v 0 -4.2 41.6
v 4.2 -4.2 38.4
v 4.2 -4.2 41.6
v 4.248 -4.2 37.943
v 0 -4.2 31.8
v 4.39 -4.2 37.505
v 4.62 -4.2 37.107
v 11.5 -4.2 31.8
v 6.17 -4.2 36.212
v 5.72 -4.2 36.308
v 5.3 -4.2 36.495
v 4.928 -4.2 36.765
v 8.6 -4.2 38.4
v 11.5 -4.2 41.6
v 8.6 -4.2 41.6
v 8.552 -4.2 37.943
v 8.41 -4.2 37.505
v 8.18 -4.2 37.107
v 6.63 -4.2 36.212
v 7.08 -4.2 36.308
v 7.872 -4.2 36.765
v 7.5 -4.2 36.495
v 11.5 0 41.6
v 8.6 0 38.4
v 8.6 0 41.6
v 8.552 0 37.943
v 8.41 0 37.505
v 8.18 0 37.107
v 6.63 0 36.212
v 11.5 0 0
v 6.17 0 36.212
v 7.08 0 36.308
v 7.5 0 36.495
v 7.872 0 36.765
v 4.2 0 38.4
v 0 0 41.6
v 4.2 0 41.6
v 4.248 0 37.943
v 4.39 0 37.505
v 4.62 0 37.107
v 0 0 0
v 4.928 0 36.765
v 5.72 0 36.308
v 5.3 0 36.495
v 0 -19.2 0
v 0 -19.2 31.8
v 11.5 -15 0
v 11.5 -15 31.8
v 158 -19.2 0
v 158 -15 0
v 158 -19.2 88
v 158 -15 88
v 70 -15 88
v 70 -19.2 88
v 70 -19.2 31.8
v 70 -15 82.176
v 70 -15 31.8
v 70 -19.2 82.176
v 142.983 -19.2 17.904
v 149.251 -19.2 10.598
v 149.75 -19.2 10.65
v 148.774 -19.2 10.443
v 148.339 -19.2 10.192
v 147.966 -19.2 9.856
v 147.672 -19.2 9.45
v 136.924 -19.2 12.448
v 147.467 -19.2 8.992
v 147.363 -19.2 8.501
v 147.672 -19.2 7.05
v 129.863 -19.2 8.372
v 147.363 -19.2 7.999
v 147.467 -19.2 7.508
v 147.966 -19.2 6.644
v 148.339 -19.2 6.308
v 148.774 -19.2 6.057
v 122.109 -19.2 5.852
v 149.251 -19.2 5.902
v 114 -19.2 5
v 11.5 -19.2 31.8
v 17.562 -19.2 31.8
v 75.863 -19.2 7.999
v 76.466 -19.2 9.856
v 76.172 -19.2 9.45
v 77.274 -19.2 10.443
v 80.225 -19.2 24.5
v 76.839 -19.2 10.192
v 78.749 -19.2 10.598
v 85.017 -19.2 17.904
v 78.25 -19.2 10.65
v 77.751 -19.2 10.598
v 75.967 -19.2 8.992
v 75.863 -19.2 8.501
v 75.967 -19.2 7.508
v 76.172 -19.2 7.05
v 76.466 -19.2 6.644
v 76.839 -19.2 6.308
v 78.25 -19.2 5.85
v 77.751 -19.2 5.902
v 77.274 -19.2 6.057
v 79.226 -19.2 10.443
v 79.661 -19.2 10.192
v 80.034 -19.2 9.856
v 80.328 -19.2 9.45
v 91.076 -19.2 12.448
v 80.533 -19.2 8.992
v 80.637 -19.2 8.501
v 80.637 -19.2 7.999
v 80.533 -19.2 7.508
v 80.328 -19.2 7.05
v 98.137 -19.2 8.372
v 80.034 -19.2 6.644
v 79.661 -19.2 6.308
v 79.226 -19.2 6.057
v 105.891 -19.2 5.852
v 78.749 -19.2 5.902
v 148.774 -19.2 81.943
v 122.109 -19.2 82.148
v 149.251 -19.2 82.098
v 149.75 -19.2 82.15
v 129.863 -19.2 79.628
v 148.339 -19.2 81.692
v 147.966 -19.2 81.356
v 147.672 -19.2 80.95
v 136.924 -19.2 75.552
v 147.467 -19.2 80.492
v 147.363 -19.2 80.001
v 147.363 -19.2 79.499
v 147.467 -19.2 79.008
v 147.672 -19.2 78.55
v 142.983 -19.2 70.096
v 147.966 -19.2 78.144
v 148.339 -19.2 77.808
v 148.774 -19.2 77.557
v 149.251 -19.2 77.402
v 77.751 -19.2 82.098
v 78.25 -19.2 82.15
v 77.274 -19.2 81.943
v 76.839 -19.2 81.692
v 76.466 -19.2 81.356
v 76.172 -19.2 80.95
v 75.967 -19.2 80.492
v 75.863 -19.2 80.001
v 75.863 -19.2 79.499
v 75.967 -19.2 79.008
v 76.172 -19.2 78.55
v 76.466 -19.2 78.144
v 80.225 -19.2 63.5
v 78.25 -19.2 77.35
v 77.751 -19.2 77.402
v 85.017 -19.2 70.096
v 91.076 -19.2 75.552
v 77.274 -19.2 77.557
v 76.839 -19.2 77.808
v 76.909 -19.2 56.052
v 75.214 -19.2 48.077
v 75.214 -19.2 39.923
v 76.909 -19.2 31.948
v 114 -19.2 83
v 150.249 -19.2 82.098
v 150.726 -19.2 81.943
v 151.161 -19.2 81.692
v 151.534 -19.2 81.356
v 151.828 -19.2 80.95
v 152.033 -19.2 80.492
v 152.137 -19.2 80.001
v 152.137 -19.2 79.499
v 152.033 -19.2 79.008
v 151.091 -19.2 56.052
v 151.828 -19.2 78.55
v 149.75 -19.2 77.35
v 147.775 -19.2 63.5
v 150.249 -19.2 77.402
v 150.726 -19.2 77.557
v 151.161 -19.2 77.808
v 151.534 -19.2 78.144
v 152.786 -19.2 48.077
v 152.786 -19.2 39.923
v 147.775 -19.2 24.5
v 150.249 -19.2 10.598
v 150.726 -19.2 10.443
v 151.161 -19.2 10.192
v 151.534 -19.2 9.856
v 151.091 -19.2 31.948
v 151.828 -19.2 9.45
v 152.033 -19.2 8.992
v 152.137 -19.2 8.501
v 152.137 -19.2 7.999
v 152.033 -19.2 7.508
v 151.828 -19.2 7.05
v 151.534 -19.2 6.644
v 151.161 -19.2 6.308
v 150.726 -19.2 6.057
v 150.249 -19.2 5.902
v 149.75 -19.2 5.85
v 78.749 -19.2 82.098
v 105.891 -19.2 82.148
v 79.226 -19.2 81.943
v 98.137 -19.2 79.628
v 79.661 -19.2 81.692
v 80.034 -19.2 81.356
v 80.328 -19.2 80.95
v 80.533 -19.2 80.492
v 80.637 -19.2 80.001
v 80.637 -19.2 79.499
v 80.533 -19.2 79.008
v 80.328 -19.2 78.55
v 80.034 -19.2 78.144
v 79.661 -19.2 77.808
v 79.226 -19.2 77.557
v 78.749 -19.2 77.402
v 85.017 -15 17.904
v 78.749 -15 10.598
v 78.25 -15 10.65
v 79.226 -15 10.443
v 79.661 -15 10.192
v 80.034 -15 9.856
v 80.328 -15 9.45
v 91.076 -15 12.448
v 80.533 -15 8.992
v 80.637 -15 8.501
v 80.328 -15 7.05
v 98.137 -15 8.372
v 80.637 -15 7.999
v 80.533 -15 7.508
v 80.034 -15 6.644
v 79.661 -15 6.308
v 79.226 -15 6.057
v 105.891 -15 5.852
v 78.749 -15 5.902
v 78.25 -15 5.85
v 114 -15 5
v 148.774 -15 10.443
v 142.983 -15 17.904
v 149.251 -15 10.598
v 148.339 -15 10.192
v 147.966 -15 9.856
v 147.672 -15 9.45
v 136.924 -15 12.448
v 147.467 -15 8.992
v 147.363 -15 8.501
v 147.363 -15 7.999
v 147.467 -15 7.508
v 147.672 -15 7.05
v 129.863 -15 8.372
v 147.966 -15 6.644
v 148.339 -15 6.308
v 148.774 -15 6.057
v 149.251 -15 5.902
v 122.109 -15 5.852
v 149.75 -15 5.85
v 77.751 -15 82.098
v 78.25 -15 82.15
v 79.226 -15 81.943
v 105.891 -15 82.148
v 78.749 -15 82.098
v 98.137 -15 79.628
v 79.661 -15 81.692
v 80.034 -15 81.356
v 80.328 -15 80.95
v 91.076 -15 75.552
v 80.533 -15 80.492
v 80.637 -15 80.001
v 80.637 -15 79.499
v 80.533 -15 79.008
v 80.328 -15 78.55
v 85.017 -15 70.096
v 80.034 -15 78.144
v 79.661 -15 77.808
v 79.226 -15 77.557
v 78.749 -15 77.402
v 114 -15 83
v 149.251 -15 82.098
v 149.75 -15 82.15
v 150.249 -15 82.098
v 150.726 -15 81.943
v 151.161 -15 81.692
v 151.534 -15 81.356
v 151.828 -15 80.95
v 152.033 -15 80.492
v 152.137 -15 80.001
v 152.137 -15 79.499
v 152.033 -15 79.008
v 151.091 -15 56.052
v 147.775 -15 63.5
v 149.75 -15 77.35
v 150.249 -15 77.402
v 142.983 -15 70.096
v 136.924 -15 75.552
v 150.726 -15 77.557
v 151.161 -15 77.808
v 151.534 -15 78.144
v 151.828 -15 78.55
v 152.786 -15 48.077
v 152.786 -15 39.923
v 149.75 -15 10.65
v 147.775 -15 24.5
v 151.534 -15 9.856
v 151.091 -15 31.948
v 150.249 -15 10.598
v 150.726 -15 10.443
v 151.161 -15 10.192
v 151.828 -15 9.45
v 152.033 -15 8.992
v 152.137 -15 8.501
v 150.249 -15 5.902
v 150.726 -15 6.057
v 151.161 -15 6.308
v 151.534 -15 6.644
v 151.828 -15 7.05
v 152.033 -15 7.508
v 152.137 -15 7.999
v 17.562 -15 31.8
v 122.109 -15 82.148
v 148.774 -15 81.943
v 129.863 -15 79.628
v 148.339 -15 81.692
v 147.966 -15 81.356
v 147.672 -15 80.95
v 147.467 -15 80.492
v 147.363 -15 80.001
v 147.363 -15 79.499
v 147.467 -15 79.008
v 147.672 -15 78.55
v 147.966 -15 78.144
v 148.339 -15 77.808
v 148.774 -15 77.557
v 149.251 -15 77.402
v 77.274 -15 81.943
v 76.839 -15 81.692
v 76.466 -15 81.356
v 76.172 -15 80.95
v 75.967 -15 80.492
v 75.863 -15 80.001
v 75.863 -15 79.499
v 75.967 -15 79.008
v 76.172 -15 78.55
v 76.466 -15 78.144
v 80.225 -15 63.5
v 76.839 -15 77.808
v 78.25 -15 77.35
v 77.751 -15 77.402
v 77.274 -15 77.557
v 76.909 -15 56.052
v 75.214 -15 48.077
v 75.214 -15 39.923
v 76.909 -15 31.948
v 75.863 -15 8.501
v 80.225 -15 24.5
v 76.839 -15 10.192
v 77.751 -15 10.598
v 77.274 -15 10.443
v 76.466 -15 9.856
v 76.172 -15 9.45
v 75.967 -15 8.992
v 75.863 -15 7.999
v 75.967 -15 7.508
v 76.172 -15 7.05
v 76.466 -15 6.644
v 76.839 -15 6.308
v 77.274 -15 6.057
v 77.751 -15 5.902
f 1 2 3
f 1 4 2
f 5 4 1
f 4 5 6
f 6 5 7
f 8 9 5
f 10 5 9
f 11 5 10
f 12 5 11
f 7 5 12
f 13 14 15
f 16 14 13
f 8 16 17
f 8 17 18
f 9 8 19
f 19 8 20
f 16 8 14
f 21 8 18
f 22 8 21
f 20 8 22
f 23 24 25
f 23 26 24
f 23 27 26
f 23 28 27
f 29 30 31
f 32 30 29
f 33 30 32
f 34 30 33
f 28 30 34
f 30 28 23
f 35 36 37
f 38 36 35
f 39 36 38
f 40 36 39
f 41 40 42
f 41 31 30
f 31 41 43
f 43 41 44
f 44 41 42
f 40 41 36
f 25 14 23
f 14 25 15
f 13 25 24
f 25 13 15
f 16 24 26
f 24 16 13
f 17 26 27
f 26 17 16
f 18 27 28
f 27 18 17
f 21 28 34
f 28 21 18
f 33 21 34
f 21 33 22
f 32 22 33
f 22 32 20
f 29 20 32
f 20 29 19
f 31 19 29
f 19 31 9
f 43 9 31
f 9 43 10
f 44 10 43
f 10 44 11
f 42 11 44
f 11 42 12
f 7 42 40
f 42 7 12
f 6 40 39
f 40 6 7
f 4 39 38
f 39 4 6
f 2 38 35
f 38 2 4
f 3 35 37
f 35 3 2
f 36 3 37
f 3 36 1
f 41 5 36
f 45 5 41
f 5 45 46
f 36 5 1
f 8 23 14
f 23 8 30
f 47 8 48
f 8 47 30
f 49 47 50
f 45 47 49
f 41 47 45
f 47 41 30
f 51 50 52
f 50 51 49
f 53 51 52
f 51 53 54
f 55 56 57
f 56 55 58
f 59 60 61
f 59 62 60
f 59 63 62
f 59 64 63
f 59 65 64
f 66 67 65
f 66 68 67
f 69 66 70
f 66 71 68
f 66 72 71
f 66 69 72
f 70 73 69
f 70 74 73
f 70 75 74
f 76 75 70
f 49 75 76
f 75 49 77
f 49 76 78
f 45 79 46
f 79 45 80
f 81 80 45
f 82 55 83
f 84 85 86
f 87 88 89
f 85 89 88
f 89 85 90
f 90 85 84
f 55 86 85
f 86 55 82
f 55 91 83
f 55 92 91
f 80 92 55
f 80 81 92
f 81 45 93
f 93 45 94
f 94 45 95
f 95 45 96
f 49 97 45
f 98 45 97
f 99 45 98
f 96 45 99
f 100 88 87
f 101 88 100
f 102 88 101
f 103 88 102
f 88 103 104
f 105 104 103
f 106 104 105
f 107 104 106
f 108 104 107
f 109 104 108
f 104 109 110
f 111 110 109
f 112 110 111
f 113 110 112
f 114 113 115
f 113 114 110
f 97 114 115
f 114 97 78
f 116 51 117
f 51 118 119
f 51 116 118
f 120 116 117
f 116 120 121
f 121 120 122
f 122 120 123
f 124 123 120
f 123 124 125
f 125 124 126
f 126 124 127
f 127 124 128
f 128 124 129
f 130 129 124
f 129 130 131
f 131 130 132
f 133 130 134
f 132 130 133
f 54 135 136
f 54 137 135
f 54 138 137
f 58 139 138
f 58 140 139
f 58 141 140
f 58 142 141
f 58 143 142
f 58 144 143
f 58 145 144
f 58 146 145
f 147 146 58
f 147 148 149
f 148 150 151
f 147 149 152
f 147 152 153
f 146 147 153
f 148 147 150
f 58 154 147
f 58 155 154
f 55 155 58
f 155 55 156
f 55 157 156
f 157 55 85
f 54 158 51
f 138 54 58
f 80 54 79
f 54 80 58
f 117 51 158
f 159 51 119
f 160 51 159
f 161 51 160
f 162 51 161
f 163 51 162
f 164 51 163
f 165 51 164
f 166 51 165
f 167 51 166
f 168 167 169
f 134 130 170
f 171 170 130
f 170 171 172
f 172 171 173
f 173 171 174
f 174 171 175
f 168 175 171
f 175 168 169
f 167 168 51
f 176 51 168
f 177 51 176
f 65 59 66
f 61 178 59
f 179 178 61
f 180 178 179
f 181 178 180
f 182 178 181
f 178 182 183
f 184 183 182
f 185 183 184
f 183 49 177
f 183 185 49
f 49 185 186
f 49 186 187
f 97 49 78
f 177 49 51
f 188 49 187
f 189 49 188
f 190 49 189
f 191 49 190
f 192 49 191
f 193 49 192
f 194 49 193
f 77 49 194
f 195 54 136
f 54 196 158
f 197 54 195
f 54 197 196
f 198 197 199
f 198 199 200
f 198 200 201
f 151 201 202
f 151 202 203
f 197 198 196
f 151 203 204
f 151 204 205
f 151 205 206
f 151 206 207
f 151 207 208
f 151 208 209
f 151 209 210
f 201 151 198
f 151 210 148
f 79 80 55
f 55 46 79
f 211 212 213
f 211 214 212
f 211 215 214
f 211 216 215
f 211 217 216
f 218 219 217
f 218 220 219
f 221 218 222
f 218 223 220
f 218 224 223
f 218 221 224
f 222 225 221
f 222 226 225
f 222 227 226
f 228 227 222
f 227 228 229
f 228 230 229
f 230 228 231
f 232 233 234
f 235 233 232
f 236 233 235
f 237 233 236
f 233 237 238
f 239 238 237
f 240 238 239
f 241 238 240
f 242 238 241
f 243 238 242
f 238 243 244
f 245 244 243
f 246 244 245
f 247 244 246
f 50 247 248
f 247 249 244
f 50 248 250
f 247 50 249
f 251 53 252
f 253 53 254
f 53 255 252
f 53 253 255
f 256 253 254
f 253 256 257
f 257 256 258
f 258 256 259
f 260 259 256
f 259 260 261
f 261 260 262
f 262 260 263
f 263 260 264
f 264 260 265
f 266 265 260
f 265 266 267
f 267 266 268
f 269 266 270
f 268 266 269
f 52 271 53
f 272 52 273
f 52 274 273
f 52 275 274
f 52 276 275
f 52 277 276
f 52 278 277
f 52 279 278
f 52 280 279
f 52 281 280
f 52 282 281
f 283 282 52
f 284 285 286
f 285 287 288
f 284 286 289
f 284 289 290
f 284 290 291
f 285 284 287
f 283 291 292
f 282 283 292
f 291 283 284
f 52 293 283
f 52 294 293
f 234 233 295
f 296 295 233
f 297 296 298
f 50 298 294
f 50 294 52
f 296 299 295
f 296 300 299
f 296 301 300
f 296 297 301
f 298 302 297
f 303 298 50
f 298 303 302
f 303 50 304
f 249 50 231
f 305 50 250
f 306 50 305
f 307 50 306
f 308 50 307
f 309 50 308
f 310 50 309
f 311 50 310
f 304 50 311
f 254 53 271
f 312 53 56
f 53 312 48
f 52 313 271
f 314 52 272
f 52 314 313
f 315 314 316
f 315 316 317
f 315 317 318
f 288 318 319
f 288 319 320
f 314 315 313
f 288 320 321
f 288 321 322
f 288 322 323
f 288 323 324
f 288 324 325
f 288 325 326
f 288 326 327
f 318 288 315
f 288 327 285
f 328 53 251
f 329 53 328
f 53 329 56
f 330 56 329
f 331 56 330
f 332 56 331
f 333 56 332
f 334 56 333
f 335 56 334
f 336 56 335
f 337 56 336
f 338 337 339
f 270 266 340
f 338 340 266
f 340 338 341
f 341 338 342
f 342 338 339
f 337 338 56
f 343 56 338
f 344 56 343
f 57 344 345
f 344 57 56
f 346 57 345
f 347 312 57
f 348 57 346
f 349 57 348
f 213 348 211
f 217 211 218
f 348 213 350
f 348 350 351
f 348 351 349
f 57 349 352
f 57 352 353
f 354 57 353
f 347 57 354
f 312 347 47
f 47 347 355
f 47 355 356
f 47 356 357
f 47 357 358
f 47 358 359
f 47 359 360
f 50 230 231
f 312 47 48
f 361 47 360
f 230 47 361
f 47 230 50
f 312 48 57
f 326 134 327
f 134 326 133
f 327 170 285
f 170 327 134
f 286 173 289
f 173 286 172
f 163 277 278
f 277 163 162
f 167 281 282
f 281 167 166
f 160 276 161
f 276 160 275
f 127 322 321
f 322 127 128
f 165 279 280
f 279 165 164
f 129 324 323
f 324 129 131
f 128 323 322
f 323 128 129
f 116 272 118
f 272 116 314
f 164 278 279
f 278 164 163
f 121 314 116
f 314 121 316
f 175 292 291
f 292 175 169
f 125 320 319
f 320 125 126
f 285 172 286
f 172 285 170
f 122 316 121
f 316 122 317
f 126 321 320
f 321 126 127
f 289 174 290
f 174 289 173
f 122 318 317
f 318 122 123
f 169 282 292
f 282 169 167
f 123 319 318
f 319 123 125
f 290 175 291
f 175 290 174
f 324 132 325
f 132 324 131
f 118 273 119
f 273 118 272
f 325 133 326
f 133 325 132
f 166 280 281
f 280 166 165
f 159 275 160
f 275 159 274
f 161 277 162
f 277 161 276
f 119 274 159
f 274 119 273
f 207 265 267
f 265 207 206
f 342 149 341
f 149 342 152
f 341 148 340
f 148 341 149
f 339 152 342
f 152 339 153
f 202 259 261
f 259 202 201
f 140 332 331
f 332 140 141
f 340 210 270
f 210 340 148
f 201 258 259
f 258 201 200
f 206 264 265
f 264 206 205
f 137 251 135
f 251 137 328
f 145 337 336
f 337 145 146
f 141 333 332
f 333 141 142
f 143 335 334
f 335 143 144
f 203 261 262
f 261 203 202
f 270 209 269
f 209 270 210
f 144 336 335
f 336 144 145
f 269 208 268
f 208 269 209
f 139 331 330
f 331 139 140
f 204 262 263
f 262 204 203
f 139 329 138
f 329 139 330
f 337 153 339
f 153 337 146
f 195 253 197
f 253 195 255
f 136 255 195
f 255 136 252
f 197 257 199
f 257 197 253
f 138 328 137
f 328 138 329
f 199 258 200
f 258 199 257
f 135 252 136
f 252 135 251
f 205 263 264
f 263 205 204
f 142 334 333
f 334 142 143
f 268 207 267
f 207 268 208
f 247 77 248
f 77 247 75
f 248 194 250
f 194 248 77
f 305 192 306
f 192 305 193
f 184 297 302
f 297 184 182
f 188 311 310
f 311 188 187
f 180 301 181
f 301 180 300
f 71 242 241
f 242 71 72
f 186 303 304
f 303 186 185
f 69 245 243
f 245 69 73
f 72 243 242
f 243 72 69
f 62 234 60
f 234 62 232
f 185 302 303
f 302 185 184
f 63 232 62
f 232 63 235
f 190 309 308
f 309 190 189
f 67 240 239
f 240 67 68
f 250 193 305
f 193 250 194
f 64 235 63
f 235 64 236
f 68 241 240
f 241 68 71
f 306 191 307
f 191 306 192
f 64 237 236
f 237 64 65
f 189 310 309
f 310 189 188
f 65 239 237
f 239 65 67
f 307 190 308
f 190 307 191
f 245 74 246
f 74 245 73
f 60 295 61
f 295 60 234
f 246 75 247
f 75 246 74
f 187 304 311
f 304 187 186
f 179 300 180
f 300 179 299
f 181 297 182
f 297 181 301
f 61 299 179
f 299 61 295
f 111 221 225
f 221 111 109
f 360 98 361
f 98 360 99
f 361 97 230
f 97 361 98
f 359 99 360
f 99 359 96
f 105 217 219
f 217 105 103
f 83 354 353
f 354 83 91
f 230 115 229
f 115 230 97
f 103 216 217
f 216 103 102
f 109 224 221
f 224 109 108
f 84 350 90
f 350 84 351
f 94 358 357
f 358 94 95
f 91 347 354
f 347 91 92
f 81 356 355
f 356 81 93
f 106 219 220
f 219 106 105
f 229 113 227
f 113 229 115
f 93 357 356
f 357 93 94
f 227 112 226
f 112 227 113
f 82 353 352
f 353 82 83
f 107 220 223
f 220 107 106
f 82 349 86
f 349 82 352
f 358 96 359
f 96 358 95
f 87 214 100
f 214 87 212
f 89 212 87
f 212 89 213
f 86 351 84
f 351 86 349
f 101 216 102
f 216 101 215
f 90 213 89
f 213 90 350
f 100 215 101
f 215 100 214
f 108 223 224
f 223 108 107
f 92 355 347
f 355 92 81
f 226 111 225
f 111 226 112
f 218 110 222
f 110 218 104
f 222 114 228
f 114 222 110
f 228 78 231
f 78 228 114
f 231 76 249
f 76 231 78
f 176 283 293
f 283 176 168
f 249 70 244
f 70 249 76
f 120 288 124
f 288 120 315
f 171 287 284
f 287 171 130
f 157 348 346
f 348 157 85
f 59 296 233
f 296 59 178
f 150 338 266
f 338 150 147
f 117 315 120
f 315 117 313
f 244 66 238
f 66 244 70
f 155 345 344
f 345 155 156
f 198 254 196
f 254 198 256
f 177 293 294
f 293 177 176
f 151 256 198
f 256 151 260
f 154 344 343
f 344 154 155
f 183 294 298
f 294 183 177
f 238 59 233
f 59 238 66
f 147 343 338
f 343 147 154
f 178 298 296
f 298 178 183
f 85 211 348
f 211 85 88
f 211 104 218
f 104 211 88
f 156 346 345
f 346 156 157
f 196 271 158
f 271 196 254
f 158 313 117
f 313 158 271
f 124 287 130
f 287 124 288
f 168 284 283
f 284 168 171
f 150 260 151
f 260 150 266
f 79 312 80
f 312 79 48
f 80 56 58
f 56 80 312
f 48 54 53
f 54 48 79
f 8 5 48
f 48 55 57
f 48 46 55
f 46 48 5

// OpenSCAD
// file: ../finger/finger.scad
// PC case Finger (slot cover)
// Author: JayEye <jayeye@gmail.com>
//
// For the latest version, look in
// https://github.com/jayeye/jum/tree/master/src/scad/finger
//
// The following dimensions are taken from
// http://www.lo-tech.co.uk/w/images/0/0b/RAM-and-EMS-Board-Slot-Bracket-r01.png
// All distances are in millimeters.
//
//
// Body, looking from the outside.
//                                                        B.-----.A
//                                                        /      |
//                                                       /       |
//            D.-------------------//-------------------'C       |
//            /                                                  |
//  F.-------'E                                                  |
//   |                                                           |
//   |                                                           |
//  G`-------.H                                          K.------'L
//            \                                          /
//            I`-------------------//-------------------'J
//
// Horizontal distances:
// AB: 2.8
// AC: 6.1
// AG: 120
// AH: 112.8
// AJ: 8.5
// AK: 5.7
//
// Vertical distances:
// AL: 18.8
// LJ: 2.8
// FG: 10.2
// JD: 18.3

module finger_front() {
  u = (18.3 - 10.2) / 2;

  A = [0, 0];
  B = A + [-2.8, 0];
  L = A + [0, -18.8];
  K = L + [-5.7, 0];
  J = [-8.5, K[1] - 2.8];
  H = [-112.8, J[1] + u];
  I = [H[0] + u, J[1]];
  G = [-120, H[1]];
  F = G + [0, 10.2];
  E = [H[0], F[1]];
  D = [I[0], J[1] + 18.3];
  C = A + [-6.1, D[1]];
  B = A + [-2.8, 0];

  Fa = F + [0, -1]; // chamfer the corners!
  Fb = F + [1, 0];

  Ga = G + [0, 1];
  Gb = G + [1, 0];

  polygon(points=[A, B, C, D, E, Fb, Fa, Ga, Gb, H, I, J, K, L],
          paths=[[0, 1, 2, 3, 4, 5, 6, 7, 8, 9, 10, 11, 12, 13]]);
}


// Tab, looking from above:
//
//  P.------.Q   V.---.M
//   |      |     |   |
//   |      |     |   |
//   |      R  S  T   |
//   |       \___/    |
//   |                |
//   |                |
//   |                |
//   |                |
//  O`----------------'N
//
// 
// Horizontal distances:
// PS: 6.4
// ON: 11.5
// QV: 4.4
//
// Vertical distances:
// MS: 3.2
// MN: 18.8
//
// S is the center of a semicircle.

module finger_top() {
  r = 4.4 / 2;

  M = [0, 0];
  N = M + [0, -18.8];
  O = N + [-11.5, 0];
  P = [O[0], 0];
  S = P + [6.4, -3.2];
  R = S + [-r, 0];
  T = S + [r, 0];
  Q = [R[0], 0];
  V = [T[0], 0];

  difference() {
    polygon(points=[M, N, O, P, Q, R, T, V],
            paths=[[0, 1, 2, 3, 4, 5, 6, 7]]);
    translate(S) circle(r=r);
  }
}

module finger_full(finger_thickness=1) {
  color("cyan")
    linear_extrude(height=finger_thickness) 
      finger_front();
  color("magenta")
    translate([0, 0, finger_thickness])
      rotate(90, [0, 1, 0])
        linear_extrude(height=finger_thickness)
          finger_top();
  color("yellow")
    scale([1, -1, 1])
      cube([finger_thickness, 18.8, finger_thickness]);
}

finger_full();
// main file
$fn=30;
use <../finger/finger.scad>

// Cooling fan for cards, supported from a finger in an empty slot.
// Author: JayEye <jayeye@gmail.com>
//
// For the latest version, look in
// https://github.com/jayeye/jum/tree/master/src/scad/fingerfan

//finger_fan_bracket();

z_shift = -20;  // move the works down

//module finger_fan_bracket() {
  fan_size = 80;
  fan_hole_distance = 71.5;
  finger_thickness = .9;    // I print at .15 z-resolution, so I want these to be multiples of Δz.
  fan_frame_padding = 4;    // how much more plastic to put around the fan.

  bracket_tab_thickness = 4.2;

  bracket_thickness = bracket_tab_thickness;  //
  bracket_fan_distance_from_case = 110 - fan_size / 2;
  bracket_fan_distance_from_cards = 15;

  finger_full_z = (18.8 + 2.8);  // AL + LJ
  finger_full_x = 11.5;  // NO

  bottom_drop = (z_shift < 0) ? -z_shift : 0;
  top_raise = (z_shift > 0) ? z_shift : 0;


  llx = finger_full_x;
  llz = finger_full_z + bottom_drop - (3.2 + 4.4 * 1.5);
  urx = bracket_fan_distance_from_case;
  urz = 2 * fan_frame_padding + top_raise + fan_size;
  dx = urx - llx;
  dz = urz - llz;

  scale([1, -1, 1]) {
    // finger pad
    color("blue")
    union() {
      translate([finger_full_x, bracket_tab_thickness, finger_full_z + bottom_drop]) {
        rotate(90, [1, 0, 0]) {
          linear_extrude(height=bracket_tab_thickness) finger_top();
        }
      }
      cube([finger_full_x, bracket_tab_thickness, finger_full_z/2 + bottom_drop]);
    }

    cube([finger_full_x, bracket_fan_distance_from_cards, llz]);

    translate([0, bracket_fan_distance_from_cards, 0]) {
      cube([bracket_fan_distance_from_case, bracket_thickness, llz]);
      translate([bracket_fan_distance_from_case, 0, 0]) {
      // padding around the fan
        difference() {
          cube([2 * fan_frame_padding + fan_size, bracket_thickness, 2 * fan_frame_padding + fan_size + top_raise]);
  	  translate([fan_frame_padding + .1, 0, fan_frame_padding + top_raise + .1]) {
              cube([fan_size - .2, bracket_thickness, fan_size - .2]);    
            }
          }
        translate([fan_frame_padding, 0, fan_frame_padding + top_raise]) {
          rotate(90) {
            translate([0, -fan_size/2, fan_size/2]) {
              rotate(90, [0, 1, 0]) {
                fan_frame(frame_thickness=bracket_thickness);
              }
            }
          }
        }
      }
      phi = atan2(dz, dx);
      dr = sqrt(dx*dx + dz*dz);
      translate([llx, 0, llz]) {
        intersection() {
          cube([dx, bracket_thickness, dz]);
          rotate(90-phi, [0, 1, 0]) {
            cube([bracket_thickness, bracket_thickness, dr]);
          }
        }
      }    
    }
  }


  // show, but probably don't print, the actual finger
  *translate([0, finger_thickness, finger_full_z + bottom_drop]) {
    rotate(-90, [0, 1, 0]) {
      rotate(-90) {
        finger_full(finger_thickness);
      }
    }
  }  
//}

module fan_frame(
  frame_thickness=1,
  fan_size=80,
  hole_distance=71.5,
  hole_diameter=4.8,  // this is the hole of the *bracket*, not the fan itself!
  raised_studs=0,
) {
  stud_radius = (fan_size - hole_distance) / 2;
  difference() {
    // ++++++++
    union() {
      translate([-fan_size / 2, -fan_size / 2, 0]) {
        cube([fan_size, fan_size, frame_thickness]);
      }
      for (x = [-hole_distance / 2, hole_distance / 2]) {
        for (y = [-hole_distance / 2, hole_distance / 2]) {
          translate([x, y, frame_thickness]) {
            cylinder(r=stud_radius, h=raised_studs);
          }
        }
      }
    }
    // --------
    for (x = [-hole_distance / 2, hole_distance / 2]) {
      for (y = [-hole_distance / 2, hole_distance / 2]) {
        translate([x, y, 0]) {
          cylinder(r=(hole_diameter / 2), h=(frame_thickness + raised_studs));
        }
      }
    }
    cylinder(r=((fan_size - 2) / 2), h = frame_thickness);
  }
}
